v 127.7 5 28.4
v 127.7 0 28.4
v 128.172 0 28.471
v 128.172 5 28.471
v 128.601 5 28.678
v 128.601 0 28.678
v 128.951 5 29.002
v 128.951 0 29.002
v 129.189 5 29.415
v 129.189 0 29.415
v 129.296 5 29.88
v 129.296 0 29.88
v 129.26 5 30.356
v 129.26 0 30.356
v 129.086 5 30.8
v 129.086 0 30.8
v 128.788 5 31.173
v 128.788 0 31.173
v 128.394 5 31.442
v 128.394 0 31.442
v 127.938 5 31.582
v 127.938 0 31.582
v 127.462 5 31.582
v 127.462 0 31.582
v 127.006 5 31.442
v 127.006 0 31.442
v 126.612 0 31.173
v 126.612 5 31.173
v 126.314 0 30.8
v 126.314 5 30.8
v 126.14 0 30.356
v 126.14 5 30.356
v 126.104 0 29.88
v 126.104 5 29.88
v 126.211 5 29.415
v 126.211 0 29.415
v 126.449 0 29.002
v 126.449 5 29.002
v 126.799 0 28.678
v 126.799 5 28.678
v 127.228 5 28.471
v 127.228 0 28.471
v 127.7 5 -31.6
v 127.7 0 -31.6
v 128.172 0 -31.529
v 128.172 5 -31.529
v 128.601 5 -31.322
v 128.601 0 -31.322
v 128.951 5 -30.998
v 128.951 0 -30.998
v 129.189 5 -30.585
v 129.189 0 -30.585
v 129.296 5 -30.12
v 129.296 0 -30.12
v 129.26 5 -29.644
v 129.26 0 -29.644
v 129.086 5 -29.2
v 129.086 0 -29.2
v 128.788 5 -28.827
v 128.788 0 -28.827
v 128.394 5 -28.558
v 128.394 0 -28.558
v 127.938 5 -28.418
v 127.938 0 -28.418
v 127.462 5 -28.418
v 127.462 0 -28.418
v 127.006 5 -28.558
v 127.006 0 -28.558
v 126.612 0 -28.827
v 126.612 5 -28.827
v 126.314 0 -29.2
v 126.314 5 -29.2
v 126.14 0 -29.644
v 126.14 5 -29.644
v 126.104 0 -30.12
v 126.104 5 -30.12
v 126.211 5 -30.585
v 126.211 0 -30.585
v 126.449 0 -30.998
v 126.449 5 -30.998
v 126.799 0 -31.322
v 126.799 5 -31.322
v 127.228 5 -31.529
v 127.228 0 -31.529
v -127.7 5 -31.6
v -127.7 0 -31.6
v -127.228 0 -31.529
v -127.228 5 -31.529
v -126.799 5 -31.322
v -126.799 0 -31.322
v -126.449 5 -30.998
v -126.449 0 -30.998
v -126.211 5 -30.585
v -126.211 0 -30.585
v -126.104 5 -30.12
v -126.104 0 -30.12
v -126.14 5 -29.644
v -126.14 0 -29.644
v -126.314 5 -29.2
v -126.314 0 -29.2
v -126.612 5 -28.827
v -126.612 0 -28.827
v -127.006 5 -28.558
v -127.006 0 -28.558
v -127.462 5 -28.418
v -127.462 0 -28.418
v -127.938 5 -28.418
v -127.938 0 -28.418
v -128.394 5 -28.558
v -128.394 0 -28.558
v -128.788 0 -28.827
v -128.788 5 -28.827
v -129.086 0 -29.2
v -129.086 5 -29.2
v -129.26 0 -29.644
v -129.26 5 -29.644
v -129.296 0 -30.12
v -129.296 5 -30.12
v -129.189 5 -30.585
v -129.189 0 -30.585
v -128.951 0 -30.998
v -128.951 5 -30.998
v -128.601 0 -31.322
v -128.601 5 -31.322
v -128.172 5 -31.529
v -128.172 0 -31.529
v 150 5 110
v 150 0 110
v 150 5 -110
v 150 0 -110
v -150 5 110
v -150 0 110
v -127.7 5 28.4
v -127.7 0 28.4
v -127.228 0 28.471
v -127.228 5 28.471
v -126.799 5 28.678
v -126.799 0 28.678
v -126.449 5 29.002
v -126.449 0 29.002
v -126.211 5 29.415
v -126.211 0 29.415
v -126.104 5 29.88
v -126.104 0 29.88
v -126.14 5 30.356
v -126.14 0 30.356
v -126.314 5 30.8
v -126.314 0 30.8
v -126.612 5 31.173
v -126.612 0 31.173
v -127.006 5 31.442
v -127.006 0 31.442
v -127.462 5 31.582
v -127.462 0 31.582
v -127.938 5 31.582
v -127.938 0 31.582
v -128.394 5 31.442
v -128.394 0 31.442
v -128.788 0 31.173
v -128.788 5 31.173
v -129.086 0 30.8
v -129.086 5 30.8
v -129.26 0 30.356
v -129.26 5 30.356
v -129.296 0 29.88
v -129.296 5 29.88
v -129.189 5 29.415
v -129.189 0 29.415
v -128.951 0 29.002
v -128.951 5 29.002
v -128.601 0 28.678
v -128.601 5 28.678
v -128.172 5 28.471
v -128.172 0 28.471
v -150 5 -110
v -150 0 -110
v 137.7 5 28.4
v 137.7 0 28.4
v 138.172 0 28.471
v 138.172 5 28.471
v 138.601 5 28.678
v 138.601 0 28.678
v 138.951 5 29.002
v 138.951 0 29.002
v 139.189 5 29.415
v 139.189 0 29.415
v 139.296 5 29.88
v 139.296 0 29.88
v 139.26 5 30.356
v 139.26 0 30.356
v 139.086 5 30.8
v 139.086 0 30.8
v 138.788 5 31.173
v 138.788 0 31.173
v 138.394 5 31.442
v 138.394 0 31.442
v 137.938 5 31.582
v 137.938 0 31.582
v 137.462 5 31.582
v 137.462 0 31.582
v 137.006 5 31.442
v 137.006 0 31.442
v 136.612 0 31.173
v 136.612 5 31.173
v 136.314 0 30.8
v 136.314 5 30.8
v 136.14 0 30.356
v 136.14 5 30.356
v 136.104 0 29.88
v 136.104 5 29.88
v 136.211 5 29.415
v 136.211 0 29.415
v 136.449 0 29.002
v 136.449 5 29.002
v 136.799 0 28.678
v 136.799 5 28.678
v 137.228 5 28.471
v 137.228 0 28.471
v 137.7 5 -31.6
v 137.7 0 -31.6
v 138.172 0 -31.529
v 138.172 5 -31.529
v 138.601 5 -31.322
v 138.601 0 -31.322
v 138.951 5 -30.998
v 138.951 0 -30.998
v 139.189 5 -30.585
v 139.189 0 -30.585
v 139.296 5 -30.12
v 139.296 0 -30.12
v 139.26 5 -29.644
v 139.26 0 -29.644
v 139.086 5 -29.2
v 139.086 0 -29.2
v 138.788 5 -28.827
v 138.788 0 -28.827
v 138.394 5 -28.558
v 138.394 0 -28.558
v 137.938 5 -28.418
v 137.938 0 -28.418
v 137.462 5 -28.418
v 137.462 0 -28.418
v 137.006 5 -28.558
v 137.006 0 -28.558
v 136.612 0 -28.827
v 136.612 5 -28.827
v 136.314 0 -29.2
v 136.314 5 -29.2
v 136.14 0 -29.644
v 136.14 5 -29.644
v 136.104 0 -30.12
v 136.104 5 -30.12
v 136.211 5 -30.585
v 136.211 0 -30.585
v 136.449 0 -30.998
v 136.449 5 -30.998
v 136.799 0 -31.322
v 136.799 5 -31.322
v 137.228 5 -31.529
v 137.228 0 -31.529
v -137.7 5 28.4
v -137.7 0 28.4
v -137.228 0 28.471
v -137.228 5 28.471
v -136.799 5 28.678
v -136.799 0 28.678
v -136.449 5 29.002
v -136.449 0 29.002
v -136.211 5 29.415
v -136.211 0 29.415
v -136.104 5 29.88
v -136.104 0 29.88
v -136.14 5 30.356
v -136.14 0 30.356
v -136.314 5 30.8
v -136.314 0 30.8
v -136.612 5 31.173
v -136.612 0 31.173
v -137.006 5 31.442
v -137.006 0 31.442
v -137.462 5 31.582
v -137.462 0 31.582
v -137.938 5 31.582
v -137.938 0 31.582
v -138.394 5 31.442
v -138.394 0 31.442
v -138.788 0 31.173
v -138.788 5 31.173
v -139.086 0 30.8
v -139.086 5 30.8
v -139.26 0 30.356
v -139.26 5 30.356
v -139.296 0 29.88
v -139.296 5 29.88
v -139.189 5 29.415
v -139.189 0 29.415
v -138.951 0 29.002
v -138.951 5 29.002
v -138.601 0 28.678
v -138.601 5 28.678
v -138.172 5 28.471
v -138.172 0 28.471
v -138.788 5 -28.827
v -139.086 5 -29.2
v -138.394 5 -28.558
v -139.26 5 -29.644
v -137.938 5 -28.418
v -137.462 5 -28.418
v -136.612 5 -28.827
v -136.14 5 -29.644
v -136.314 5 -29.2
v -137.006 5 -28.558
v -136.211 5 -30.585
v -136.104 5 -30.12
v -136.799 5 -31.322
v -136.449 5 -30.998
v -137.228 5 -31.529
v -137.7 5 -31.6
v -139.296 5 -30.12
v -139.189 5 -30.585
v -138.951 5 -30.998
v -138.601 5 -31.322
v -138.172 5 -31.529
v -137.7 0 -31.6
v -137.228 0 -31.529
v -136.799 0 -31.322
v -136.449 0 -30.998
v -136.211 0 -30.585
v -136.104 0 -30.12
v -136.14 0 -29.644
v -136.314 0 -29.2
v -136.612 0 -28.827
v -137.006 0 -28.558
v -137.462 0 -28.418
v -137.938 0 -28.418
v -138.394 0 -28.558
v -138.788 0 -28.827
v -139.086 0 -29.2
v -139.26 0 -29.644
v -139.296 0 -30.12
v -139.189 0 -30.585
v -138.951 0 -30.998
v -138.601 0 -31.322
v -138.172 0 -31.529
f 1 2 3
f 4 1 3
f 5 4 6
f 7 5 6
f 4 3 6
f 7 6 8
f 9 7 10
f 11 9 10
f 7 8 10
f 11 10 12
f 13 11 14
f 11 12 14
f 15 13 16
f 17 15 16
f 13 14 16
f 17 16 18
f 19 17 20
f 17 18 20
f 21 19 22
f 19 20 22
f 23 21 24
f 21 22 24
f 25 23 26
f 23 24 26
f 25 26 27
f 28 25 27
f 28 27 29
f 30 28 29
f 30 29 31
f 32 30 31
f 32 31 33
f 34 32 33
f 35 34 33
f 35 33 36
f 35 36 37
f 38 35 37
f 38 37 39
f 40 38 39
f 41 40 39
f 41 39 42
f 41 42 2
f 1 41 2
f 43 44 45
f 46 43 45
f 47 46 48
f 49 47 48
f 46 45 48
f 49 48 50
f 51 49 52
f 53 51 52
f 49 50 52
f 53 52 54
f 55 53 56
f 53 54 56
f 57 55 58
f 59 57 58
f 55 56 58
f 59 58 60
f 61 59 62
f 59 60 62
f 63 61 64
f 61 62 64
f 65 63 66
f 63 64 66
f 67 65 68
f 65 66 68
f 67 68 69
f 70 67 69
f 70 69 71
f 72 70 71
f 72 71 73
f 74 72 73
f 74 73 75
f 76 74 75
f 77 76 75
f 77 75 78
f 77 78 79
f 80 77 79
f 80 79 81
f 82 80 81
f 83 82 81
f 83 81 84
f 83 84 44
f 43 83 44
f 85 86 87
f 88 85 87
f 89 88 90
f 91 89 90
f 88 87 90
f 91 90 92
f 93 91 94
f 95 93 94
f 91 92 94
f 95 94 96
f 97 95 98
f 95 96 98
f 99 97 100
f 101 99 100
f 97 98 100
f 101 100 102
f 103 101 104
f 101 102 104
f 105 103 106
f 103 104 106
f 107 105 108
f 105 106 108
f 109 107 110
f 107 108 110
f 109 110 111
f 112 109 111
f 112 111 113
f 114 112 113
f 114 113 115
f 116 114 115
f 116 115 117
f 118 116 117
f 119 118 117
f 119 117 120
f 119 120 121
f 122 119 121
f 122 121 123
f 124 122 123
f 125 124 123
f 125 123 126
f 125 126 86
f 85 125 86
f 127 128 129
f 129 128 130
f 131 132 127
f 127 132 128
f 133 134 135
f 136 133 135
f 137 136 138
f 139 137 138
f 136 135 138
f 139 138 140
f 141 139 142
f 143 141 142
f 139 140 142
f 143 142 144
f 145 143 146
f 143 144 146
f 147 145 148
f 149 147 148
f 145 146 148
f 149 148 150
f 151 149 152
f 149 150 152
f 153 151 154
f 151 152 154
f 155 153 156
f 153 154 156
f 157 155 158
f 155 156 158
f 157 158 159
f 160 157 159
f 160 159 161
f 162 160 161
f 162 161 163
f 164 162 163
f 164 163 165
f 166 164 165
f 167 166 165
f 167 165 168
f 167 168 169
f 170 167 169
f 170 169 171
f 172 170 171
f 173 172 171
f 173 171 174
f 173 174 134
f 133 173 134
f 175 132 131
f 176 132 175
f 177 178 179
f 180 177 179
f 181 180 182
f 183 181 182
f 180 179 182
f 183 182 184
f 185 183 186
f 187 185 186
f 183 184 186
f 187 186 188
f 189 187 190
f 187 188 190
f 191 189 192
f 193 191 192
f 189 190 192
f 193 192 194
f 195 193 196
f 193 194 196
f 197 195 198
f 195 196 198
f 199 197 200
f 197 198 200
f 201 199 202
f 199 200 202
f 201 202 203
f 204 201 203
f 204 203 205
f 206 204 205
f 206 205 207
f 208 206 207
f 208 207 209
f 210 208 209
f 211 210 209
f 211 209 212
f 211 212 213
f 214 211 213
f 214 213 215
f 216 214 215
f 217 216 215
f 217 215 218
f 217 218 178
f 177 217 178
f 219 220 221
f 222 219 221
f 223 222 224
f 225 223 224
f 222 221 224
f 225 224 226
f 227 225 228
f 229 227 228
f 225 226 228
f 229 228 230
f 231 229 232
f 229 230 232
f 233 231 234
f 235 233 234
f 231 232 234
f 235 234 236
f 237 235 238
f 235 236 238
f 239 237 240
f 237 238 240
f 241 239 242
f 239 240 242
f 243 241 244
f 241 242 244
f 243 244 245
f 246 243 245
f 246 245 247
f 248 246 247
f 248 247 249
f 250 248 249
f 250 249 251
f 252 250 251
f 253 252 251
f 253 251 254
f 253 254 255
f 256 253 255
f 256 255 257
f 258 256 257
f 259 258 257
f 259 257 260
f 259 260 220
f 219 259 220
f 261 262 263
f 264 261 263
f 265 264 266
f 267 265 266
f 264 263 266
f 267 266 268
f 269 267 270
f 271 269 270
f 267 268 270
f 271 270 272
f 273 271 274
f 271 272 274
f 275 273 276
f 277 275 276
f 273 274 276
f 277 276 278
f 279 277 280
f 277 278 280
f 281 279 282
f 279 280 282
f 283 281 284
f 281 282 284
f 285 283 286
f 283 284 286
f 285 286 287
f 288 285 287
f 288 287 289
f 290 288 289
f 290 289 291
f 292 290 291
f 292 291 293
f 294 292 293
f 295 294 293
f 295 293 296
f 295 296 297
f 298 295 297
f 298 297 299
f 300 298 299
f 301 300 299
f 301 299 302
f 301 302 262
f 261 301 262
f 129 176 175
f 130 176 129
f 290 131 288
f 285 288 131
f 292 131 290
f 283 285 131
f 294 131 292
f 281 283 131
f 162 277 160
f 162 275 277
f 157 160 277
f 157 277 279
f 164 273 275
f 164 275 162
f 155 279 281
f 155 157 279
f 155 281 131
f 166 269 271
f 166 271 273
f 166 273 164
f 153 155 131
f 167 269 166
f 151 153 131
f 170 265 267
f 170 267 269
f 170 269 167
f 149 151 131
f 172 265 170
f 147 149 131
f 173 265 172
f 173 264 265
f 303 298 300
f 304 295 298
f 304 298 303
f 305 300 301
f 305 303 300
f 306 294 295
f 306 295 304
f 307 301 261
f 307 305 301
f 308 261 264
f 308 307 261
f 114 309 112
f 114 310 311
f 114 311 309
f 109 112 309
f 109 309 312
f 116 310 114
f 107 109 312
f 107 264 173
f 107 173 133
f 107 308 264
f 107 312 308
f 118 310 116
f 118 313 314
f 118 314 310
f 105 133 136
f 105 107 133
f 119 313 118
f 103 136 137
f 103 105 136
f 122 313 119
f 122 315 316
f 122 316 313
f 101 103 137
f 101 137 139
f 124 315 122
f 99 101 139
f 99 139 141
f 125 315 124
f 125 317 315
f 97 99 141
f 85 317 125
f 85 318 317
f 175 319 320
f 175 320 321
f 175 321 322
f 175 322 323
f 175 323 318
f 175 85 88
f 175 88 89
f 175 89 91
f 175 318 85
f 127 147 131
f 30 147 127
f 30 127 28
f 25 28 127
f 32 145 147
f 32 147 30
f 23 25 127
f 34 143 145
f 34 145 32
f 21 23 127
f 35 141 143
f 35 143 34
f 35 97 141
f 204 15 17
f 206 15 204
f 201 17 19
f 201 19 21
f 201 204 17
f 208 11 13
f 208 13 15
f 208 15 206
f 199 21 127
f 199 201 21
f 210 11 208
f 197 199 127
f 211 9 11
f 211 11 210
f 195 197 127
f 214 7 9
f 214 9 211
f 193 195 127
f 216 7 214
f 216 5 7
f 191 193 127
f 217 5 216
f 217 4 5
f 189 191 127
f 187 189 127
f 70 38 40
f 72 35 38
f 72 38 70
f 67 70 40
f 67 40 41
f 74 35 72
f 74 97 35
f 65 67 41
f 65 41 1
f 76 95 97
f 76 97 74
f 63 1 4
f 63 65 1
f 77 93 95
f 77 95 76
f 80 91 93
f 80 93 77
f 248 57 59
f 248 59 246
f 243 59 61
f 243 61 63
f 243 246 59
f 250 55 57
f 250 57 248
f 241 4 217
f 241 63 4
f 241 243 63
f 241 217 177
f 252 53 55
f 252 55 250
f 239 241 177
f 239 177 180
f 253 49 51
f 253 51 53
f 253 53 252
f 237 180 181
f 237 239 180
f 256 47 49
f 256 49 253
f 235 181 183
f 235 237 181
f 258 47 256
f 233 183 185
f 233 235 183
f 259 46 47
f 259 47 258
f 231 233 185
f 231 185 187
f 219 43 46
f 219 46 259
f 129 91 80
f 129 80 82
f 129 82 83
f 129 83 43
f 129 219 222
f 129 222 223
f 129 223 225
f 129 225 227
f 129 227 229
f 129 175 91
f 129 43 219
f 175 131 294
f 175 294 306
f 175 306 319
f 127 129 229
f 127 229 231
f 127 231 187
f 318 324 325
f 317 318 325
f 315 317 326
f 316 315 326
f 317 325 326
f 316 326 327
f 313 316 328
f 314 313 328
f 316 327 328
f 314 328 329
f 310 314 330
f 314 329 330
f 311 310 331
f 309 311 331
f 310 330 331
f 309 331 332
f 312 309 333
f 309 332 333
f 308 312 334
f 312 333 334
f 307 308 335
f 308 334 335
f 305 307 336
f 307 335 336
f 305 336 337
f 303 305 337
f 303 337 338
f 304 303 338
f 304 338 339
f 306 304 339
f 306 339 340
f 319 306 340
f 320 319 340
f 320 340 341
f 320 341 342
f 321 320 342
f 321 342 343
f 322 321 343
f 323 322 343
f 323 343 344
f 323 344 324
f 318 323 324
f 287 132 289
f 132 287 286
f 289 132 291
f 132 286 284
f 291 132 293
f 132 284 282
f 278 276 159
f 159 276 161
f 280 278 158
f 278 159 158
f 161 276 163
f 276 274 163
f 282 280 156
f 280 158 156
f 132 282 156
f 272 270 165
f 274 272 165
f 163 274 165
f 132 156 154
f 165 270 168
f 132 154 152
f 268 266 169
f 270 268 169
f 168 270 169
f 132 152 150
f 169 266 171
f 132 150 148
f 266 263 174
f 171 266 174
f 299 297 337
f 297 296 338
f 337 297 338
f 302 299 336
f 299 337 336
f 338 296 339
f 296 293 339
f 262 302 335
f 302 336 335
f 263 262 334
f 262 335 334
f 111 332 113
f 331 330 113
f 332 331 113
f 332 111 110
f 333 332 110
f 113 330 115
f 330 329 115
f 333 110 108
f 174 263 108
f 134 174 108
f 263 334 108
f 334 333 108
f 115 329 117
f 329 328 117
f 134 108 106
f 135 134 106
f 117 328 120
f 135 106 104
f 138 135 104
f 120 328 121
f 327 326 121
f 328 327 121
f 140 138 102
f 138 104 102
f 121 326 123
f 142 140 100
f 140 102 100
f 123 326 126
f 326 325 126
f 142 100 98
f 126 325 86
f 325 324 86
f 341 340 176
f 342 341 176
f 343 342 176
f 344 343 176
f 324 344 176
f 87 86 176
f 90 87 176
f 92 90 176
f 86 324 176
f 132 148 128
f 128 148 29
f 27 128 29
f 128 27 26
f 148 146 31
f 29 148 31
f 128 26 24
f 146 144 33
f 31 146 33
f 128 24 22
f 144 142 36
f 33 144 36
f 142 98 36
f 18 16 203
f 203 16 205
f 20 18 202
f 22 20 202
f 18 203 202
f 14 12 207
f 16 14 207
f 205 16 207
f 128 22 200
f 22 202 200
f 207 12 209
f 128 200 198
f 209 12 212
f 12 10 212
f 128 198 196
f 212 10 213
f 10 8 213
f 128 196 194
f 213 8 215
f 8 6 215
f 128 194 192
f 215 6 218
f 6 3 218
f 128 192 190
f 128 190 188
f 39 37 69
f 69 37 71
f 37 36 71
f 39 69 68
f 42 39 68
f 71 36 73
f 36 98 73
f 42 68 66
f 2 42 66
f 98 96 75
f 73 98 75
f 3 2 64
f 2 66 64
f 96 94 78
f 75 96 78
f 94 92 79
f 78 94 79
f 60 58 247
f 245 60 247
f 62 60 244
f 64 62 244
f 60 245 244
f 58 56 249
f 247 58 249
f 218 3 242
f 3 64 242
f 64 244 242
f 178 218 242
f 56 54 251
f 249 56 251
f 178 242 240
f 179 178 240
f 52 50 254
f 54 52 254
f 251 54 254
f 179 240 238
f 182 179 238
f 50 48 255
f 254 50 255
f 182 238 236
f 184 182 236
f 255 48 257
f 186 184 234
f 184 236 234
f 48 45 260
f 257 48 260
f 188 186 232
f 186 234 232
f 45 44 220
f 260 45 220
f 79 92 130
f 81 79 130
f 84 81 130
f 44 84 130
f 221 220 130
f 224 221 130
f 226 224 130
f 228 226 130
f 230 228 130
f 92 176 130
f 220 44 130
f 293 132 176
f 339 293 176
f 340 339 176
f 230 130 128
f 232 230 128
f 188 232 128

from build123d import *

# Parameters (mm, degrees)
SKETCH1_W           = 300
SKETCH1_H           = 220
BOSS_EXTRUDE1_DEPTH = 5
SKETCH2_R           = 1.6
CUT_EXTRUDE1_DEPTH  = 10


with BuildPart() as part:
    # Sketch1 → Boss-Extrude1 (new body)
    with BuildSketch(Plane(origin=(0, 0, 0), x_dir=(1, 0, 0), z_dir=(0, 1, 0))):
        Rectangle(SKETCH1_W, SKETCH1_H)
    extrude(amount=BOSS_EXTRUDE1_DEPTH)

    # Sketch2 → Cut-Extrude1 (cut)
    with BuildSketch(Plane.XZ):
        with Locations(Location((-137.7, -30, 0), (0, 0, 270))):
            Circle(SKETCH2_R)
        with Locations(Location((-127.7, -30, 0), (0, 0, 270))):
            Circle(SKETCH2_R)
        with Locations(Location((-137.7, 30, 0), (0, 0, 270))):
            Circle(SKETCH2_R)
        with Locations(Location((-127.7, 30, 0), (0, 0, 270))):
            Circle(SKETCH2_R)
        with Locations(Location((137.7, 30, 0), (0, 0, 270))):
            Circle(SKETCH2_R)
        with Locations(Location((137.7, -30, 0), (0, 0, 270))):
            Circle(SKETCH2_R)
        with Locations(Location((127.7, -30, 0), (0, 0, 270))):
            Circle(SKETCH2_R)
        with Locations(Location((127.7, 30, 0), (0, 0, 270))):
            Circle(SKETCH2_R)
    extrude(amount=-CUT_EXTRUDE1_DEPTH, mode=Mode.SUBTRACT)


solid = part.part
